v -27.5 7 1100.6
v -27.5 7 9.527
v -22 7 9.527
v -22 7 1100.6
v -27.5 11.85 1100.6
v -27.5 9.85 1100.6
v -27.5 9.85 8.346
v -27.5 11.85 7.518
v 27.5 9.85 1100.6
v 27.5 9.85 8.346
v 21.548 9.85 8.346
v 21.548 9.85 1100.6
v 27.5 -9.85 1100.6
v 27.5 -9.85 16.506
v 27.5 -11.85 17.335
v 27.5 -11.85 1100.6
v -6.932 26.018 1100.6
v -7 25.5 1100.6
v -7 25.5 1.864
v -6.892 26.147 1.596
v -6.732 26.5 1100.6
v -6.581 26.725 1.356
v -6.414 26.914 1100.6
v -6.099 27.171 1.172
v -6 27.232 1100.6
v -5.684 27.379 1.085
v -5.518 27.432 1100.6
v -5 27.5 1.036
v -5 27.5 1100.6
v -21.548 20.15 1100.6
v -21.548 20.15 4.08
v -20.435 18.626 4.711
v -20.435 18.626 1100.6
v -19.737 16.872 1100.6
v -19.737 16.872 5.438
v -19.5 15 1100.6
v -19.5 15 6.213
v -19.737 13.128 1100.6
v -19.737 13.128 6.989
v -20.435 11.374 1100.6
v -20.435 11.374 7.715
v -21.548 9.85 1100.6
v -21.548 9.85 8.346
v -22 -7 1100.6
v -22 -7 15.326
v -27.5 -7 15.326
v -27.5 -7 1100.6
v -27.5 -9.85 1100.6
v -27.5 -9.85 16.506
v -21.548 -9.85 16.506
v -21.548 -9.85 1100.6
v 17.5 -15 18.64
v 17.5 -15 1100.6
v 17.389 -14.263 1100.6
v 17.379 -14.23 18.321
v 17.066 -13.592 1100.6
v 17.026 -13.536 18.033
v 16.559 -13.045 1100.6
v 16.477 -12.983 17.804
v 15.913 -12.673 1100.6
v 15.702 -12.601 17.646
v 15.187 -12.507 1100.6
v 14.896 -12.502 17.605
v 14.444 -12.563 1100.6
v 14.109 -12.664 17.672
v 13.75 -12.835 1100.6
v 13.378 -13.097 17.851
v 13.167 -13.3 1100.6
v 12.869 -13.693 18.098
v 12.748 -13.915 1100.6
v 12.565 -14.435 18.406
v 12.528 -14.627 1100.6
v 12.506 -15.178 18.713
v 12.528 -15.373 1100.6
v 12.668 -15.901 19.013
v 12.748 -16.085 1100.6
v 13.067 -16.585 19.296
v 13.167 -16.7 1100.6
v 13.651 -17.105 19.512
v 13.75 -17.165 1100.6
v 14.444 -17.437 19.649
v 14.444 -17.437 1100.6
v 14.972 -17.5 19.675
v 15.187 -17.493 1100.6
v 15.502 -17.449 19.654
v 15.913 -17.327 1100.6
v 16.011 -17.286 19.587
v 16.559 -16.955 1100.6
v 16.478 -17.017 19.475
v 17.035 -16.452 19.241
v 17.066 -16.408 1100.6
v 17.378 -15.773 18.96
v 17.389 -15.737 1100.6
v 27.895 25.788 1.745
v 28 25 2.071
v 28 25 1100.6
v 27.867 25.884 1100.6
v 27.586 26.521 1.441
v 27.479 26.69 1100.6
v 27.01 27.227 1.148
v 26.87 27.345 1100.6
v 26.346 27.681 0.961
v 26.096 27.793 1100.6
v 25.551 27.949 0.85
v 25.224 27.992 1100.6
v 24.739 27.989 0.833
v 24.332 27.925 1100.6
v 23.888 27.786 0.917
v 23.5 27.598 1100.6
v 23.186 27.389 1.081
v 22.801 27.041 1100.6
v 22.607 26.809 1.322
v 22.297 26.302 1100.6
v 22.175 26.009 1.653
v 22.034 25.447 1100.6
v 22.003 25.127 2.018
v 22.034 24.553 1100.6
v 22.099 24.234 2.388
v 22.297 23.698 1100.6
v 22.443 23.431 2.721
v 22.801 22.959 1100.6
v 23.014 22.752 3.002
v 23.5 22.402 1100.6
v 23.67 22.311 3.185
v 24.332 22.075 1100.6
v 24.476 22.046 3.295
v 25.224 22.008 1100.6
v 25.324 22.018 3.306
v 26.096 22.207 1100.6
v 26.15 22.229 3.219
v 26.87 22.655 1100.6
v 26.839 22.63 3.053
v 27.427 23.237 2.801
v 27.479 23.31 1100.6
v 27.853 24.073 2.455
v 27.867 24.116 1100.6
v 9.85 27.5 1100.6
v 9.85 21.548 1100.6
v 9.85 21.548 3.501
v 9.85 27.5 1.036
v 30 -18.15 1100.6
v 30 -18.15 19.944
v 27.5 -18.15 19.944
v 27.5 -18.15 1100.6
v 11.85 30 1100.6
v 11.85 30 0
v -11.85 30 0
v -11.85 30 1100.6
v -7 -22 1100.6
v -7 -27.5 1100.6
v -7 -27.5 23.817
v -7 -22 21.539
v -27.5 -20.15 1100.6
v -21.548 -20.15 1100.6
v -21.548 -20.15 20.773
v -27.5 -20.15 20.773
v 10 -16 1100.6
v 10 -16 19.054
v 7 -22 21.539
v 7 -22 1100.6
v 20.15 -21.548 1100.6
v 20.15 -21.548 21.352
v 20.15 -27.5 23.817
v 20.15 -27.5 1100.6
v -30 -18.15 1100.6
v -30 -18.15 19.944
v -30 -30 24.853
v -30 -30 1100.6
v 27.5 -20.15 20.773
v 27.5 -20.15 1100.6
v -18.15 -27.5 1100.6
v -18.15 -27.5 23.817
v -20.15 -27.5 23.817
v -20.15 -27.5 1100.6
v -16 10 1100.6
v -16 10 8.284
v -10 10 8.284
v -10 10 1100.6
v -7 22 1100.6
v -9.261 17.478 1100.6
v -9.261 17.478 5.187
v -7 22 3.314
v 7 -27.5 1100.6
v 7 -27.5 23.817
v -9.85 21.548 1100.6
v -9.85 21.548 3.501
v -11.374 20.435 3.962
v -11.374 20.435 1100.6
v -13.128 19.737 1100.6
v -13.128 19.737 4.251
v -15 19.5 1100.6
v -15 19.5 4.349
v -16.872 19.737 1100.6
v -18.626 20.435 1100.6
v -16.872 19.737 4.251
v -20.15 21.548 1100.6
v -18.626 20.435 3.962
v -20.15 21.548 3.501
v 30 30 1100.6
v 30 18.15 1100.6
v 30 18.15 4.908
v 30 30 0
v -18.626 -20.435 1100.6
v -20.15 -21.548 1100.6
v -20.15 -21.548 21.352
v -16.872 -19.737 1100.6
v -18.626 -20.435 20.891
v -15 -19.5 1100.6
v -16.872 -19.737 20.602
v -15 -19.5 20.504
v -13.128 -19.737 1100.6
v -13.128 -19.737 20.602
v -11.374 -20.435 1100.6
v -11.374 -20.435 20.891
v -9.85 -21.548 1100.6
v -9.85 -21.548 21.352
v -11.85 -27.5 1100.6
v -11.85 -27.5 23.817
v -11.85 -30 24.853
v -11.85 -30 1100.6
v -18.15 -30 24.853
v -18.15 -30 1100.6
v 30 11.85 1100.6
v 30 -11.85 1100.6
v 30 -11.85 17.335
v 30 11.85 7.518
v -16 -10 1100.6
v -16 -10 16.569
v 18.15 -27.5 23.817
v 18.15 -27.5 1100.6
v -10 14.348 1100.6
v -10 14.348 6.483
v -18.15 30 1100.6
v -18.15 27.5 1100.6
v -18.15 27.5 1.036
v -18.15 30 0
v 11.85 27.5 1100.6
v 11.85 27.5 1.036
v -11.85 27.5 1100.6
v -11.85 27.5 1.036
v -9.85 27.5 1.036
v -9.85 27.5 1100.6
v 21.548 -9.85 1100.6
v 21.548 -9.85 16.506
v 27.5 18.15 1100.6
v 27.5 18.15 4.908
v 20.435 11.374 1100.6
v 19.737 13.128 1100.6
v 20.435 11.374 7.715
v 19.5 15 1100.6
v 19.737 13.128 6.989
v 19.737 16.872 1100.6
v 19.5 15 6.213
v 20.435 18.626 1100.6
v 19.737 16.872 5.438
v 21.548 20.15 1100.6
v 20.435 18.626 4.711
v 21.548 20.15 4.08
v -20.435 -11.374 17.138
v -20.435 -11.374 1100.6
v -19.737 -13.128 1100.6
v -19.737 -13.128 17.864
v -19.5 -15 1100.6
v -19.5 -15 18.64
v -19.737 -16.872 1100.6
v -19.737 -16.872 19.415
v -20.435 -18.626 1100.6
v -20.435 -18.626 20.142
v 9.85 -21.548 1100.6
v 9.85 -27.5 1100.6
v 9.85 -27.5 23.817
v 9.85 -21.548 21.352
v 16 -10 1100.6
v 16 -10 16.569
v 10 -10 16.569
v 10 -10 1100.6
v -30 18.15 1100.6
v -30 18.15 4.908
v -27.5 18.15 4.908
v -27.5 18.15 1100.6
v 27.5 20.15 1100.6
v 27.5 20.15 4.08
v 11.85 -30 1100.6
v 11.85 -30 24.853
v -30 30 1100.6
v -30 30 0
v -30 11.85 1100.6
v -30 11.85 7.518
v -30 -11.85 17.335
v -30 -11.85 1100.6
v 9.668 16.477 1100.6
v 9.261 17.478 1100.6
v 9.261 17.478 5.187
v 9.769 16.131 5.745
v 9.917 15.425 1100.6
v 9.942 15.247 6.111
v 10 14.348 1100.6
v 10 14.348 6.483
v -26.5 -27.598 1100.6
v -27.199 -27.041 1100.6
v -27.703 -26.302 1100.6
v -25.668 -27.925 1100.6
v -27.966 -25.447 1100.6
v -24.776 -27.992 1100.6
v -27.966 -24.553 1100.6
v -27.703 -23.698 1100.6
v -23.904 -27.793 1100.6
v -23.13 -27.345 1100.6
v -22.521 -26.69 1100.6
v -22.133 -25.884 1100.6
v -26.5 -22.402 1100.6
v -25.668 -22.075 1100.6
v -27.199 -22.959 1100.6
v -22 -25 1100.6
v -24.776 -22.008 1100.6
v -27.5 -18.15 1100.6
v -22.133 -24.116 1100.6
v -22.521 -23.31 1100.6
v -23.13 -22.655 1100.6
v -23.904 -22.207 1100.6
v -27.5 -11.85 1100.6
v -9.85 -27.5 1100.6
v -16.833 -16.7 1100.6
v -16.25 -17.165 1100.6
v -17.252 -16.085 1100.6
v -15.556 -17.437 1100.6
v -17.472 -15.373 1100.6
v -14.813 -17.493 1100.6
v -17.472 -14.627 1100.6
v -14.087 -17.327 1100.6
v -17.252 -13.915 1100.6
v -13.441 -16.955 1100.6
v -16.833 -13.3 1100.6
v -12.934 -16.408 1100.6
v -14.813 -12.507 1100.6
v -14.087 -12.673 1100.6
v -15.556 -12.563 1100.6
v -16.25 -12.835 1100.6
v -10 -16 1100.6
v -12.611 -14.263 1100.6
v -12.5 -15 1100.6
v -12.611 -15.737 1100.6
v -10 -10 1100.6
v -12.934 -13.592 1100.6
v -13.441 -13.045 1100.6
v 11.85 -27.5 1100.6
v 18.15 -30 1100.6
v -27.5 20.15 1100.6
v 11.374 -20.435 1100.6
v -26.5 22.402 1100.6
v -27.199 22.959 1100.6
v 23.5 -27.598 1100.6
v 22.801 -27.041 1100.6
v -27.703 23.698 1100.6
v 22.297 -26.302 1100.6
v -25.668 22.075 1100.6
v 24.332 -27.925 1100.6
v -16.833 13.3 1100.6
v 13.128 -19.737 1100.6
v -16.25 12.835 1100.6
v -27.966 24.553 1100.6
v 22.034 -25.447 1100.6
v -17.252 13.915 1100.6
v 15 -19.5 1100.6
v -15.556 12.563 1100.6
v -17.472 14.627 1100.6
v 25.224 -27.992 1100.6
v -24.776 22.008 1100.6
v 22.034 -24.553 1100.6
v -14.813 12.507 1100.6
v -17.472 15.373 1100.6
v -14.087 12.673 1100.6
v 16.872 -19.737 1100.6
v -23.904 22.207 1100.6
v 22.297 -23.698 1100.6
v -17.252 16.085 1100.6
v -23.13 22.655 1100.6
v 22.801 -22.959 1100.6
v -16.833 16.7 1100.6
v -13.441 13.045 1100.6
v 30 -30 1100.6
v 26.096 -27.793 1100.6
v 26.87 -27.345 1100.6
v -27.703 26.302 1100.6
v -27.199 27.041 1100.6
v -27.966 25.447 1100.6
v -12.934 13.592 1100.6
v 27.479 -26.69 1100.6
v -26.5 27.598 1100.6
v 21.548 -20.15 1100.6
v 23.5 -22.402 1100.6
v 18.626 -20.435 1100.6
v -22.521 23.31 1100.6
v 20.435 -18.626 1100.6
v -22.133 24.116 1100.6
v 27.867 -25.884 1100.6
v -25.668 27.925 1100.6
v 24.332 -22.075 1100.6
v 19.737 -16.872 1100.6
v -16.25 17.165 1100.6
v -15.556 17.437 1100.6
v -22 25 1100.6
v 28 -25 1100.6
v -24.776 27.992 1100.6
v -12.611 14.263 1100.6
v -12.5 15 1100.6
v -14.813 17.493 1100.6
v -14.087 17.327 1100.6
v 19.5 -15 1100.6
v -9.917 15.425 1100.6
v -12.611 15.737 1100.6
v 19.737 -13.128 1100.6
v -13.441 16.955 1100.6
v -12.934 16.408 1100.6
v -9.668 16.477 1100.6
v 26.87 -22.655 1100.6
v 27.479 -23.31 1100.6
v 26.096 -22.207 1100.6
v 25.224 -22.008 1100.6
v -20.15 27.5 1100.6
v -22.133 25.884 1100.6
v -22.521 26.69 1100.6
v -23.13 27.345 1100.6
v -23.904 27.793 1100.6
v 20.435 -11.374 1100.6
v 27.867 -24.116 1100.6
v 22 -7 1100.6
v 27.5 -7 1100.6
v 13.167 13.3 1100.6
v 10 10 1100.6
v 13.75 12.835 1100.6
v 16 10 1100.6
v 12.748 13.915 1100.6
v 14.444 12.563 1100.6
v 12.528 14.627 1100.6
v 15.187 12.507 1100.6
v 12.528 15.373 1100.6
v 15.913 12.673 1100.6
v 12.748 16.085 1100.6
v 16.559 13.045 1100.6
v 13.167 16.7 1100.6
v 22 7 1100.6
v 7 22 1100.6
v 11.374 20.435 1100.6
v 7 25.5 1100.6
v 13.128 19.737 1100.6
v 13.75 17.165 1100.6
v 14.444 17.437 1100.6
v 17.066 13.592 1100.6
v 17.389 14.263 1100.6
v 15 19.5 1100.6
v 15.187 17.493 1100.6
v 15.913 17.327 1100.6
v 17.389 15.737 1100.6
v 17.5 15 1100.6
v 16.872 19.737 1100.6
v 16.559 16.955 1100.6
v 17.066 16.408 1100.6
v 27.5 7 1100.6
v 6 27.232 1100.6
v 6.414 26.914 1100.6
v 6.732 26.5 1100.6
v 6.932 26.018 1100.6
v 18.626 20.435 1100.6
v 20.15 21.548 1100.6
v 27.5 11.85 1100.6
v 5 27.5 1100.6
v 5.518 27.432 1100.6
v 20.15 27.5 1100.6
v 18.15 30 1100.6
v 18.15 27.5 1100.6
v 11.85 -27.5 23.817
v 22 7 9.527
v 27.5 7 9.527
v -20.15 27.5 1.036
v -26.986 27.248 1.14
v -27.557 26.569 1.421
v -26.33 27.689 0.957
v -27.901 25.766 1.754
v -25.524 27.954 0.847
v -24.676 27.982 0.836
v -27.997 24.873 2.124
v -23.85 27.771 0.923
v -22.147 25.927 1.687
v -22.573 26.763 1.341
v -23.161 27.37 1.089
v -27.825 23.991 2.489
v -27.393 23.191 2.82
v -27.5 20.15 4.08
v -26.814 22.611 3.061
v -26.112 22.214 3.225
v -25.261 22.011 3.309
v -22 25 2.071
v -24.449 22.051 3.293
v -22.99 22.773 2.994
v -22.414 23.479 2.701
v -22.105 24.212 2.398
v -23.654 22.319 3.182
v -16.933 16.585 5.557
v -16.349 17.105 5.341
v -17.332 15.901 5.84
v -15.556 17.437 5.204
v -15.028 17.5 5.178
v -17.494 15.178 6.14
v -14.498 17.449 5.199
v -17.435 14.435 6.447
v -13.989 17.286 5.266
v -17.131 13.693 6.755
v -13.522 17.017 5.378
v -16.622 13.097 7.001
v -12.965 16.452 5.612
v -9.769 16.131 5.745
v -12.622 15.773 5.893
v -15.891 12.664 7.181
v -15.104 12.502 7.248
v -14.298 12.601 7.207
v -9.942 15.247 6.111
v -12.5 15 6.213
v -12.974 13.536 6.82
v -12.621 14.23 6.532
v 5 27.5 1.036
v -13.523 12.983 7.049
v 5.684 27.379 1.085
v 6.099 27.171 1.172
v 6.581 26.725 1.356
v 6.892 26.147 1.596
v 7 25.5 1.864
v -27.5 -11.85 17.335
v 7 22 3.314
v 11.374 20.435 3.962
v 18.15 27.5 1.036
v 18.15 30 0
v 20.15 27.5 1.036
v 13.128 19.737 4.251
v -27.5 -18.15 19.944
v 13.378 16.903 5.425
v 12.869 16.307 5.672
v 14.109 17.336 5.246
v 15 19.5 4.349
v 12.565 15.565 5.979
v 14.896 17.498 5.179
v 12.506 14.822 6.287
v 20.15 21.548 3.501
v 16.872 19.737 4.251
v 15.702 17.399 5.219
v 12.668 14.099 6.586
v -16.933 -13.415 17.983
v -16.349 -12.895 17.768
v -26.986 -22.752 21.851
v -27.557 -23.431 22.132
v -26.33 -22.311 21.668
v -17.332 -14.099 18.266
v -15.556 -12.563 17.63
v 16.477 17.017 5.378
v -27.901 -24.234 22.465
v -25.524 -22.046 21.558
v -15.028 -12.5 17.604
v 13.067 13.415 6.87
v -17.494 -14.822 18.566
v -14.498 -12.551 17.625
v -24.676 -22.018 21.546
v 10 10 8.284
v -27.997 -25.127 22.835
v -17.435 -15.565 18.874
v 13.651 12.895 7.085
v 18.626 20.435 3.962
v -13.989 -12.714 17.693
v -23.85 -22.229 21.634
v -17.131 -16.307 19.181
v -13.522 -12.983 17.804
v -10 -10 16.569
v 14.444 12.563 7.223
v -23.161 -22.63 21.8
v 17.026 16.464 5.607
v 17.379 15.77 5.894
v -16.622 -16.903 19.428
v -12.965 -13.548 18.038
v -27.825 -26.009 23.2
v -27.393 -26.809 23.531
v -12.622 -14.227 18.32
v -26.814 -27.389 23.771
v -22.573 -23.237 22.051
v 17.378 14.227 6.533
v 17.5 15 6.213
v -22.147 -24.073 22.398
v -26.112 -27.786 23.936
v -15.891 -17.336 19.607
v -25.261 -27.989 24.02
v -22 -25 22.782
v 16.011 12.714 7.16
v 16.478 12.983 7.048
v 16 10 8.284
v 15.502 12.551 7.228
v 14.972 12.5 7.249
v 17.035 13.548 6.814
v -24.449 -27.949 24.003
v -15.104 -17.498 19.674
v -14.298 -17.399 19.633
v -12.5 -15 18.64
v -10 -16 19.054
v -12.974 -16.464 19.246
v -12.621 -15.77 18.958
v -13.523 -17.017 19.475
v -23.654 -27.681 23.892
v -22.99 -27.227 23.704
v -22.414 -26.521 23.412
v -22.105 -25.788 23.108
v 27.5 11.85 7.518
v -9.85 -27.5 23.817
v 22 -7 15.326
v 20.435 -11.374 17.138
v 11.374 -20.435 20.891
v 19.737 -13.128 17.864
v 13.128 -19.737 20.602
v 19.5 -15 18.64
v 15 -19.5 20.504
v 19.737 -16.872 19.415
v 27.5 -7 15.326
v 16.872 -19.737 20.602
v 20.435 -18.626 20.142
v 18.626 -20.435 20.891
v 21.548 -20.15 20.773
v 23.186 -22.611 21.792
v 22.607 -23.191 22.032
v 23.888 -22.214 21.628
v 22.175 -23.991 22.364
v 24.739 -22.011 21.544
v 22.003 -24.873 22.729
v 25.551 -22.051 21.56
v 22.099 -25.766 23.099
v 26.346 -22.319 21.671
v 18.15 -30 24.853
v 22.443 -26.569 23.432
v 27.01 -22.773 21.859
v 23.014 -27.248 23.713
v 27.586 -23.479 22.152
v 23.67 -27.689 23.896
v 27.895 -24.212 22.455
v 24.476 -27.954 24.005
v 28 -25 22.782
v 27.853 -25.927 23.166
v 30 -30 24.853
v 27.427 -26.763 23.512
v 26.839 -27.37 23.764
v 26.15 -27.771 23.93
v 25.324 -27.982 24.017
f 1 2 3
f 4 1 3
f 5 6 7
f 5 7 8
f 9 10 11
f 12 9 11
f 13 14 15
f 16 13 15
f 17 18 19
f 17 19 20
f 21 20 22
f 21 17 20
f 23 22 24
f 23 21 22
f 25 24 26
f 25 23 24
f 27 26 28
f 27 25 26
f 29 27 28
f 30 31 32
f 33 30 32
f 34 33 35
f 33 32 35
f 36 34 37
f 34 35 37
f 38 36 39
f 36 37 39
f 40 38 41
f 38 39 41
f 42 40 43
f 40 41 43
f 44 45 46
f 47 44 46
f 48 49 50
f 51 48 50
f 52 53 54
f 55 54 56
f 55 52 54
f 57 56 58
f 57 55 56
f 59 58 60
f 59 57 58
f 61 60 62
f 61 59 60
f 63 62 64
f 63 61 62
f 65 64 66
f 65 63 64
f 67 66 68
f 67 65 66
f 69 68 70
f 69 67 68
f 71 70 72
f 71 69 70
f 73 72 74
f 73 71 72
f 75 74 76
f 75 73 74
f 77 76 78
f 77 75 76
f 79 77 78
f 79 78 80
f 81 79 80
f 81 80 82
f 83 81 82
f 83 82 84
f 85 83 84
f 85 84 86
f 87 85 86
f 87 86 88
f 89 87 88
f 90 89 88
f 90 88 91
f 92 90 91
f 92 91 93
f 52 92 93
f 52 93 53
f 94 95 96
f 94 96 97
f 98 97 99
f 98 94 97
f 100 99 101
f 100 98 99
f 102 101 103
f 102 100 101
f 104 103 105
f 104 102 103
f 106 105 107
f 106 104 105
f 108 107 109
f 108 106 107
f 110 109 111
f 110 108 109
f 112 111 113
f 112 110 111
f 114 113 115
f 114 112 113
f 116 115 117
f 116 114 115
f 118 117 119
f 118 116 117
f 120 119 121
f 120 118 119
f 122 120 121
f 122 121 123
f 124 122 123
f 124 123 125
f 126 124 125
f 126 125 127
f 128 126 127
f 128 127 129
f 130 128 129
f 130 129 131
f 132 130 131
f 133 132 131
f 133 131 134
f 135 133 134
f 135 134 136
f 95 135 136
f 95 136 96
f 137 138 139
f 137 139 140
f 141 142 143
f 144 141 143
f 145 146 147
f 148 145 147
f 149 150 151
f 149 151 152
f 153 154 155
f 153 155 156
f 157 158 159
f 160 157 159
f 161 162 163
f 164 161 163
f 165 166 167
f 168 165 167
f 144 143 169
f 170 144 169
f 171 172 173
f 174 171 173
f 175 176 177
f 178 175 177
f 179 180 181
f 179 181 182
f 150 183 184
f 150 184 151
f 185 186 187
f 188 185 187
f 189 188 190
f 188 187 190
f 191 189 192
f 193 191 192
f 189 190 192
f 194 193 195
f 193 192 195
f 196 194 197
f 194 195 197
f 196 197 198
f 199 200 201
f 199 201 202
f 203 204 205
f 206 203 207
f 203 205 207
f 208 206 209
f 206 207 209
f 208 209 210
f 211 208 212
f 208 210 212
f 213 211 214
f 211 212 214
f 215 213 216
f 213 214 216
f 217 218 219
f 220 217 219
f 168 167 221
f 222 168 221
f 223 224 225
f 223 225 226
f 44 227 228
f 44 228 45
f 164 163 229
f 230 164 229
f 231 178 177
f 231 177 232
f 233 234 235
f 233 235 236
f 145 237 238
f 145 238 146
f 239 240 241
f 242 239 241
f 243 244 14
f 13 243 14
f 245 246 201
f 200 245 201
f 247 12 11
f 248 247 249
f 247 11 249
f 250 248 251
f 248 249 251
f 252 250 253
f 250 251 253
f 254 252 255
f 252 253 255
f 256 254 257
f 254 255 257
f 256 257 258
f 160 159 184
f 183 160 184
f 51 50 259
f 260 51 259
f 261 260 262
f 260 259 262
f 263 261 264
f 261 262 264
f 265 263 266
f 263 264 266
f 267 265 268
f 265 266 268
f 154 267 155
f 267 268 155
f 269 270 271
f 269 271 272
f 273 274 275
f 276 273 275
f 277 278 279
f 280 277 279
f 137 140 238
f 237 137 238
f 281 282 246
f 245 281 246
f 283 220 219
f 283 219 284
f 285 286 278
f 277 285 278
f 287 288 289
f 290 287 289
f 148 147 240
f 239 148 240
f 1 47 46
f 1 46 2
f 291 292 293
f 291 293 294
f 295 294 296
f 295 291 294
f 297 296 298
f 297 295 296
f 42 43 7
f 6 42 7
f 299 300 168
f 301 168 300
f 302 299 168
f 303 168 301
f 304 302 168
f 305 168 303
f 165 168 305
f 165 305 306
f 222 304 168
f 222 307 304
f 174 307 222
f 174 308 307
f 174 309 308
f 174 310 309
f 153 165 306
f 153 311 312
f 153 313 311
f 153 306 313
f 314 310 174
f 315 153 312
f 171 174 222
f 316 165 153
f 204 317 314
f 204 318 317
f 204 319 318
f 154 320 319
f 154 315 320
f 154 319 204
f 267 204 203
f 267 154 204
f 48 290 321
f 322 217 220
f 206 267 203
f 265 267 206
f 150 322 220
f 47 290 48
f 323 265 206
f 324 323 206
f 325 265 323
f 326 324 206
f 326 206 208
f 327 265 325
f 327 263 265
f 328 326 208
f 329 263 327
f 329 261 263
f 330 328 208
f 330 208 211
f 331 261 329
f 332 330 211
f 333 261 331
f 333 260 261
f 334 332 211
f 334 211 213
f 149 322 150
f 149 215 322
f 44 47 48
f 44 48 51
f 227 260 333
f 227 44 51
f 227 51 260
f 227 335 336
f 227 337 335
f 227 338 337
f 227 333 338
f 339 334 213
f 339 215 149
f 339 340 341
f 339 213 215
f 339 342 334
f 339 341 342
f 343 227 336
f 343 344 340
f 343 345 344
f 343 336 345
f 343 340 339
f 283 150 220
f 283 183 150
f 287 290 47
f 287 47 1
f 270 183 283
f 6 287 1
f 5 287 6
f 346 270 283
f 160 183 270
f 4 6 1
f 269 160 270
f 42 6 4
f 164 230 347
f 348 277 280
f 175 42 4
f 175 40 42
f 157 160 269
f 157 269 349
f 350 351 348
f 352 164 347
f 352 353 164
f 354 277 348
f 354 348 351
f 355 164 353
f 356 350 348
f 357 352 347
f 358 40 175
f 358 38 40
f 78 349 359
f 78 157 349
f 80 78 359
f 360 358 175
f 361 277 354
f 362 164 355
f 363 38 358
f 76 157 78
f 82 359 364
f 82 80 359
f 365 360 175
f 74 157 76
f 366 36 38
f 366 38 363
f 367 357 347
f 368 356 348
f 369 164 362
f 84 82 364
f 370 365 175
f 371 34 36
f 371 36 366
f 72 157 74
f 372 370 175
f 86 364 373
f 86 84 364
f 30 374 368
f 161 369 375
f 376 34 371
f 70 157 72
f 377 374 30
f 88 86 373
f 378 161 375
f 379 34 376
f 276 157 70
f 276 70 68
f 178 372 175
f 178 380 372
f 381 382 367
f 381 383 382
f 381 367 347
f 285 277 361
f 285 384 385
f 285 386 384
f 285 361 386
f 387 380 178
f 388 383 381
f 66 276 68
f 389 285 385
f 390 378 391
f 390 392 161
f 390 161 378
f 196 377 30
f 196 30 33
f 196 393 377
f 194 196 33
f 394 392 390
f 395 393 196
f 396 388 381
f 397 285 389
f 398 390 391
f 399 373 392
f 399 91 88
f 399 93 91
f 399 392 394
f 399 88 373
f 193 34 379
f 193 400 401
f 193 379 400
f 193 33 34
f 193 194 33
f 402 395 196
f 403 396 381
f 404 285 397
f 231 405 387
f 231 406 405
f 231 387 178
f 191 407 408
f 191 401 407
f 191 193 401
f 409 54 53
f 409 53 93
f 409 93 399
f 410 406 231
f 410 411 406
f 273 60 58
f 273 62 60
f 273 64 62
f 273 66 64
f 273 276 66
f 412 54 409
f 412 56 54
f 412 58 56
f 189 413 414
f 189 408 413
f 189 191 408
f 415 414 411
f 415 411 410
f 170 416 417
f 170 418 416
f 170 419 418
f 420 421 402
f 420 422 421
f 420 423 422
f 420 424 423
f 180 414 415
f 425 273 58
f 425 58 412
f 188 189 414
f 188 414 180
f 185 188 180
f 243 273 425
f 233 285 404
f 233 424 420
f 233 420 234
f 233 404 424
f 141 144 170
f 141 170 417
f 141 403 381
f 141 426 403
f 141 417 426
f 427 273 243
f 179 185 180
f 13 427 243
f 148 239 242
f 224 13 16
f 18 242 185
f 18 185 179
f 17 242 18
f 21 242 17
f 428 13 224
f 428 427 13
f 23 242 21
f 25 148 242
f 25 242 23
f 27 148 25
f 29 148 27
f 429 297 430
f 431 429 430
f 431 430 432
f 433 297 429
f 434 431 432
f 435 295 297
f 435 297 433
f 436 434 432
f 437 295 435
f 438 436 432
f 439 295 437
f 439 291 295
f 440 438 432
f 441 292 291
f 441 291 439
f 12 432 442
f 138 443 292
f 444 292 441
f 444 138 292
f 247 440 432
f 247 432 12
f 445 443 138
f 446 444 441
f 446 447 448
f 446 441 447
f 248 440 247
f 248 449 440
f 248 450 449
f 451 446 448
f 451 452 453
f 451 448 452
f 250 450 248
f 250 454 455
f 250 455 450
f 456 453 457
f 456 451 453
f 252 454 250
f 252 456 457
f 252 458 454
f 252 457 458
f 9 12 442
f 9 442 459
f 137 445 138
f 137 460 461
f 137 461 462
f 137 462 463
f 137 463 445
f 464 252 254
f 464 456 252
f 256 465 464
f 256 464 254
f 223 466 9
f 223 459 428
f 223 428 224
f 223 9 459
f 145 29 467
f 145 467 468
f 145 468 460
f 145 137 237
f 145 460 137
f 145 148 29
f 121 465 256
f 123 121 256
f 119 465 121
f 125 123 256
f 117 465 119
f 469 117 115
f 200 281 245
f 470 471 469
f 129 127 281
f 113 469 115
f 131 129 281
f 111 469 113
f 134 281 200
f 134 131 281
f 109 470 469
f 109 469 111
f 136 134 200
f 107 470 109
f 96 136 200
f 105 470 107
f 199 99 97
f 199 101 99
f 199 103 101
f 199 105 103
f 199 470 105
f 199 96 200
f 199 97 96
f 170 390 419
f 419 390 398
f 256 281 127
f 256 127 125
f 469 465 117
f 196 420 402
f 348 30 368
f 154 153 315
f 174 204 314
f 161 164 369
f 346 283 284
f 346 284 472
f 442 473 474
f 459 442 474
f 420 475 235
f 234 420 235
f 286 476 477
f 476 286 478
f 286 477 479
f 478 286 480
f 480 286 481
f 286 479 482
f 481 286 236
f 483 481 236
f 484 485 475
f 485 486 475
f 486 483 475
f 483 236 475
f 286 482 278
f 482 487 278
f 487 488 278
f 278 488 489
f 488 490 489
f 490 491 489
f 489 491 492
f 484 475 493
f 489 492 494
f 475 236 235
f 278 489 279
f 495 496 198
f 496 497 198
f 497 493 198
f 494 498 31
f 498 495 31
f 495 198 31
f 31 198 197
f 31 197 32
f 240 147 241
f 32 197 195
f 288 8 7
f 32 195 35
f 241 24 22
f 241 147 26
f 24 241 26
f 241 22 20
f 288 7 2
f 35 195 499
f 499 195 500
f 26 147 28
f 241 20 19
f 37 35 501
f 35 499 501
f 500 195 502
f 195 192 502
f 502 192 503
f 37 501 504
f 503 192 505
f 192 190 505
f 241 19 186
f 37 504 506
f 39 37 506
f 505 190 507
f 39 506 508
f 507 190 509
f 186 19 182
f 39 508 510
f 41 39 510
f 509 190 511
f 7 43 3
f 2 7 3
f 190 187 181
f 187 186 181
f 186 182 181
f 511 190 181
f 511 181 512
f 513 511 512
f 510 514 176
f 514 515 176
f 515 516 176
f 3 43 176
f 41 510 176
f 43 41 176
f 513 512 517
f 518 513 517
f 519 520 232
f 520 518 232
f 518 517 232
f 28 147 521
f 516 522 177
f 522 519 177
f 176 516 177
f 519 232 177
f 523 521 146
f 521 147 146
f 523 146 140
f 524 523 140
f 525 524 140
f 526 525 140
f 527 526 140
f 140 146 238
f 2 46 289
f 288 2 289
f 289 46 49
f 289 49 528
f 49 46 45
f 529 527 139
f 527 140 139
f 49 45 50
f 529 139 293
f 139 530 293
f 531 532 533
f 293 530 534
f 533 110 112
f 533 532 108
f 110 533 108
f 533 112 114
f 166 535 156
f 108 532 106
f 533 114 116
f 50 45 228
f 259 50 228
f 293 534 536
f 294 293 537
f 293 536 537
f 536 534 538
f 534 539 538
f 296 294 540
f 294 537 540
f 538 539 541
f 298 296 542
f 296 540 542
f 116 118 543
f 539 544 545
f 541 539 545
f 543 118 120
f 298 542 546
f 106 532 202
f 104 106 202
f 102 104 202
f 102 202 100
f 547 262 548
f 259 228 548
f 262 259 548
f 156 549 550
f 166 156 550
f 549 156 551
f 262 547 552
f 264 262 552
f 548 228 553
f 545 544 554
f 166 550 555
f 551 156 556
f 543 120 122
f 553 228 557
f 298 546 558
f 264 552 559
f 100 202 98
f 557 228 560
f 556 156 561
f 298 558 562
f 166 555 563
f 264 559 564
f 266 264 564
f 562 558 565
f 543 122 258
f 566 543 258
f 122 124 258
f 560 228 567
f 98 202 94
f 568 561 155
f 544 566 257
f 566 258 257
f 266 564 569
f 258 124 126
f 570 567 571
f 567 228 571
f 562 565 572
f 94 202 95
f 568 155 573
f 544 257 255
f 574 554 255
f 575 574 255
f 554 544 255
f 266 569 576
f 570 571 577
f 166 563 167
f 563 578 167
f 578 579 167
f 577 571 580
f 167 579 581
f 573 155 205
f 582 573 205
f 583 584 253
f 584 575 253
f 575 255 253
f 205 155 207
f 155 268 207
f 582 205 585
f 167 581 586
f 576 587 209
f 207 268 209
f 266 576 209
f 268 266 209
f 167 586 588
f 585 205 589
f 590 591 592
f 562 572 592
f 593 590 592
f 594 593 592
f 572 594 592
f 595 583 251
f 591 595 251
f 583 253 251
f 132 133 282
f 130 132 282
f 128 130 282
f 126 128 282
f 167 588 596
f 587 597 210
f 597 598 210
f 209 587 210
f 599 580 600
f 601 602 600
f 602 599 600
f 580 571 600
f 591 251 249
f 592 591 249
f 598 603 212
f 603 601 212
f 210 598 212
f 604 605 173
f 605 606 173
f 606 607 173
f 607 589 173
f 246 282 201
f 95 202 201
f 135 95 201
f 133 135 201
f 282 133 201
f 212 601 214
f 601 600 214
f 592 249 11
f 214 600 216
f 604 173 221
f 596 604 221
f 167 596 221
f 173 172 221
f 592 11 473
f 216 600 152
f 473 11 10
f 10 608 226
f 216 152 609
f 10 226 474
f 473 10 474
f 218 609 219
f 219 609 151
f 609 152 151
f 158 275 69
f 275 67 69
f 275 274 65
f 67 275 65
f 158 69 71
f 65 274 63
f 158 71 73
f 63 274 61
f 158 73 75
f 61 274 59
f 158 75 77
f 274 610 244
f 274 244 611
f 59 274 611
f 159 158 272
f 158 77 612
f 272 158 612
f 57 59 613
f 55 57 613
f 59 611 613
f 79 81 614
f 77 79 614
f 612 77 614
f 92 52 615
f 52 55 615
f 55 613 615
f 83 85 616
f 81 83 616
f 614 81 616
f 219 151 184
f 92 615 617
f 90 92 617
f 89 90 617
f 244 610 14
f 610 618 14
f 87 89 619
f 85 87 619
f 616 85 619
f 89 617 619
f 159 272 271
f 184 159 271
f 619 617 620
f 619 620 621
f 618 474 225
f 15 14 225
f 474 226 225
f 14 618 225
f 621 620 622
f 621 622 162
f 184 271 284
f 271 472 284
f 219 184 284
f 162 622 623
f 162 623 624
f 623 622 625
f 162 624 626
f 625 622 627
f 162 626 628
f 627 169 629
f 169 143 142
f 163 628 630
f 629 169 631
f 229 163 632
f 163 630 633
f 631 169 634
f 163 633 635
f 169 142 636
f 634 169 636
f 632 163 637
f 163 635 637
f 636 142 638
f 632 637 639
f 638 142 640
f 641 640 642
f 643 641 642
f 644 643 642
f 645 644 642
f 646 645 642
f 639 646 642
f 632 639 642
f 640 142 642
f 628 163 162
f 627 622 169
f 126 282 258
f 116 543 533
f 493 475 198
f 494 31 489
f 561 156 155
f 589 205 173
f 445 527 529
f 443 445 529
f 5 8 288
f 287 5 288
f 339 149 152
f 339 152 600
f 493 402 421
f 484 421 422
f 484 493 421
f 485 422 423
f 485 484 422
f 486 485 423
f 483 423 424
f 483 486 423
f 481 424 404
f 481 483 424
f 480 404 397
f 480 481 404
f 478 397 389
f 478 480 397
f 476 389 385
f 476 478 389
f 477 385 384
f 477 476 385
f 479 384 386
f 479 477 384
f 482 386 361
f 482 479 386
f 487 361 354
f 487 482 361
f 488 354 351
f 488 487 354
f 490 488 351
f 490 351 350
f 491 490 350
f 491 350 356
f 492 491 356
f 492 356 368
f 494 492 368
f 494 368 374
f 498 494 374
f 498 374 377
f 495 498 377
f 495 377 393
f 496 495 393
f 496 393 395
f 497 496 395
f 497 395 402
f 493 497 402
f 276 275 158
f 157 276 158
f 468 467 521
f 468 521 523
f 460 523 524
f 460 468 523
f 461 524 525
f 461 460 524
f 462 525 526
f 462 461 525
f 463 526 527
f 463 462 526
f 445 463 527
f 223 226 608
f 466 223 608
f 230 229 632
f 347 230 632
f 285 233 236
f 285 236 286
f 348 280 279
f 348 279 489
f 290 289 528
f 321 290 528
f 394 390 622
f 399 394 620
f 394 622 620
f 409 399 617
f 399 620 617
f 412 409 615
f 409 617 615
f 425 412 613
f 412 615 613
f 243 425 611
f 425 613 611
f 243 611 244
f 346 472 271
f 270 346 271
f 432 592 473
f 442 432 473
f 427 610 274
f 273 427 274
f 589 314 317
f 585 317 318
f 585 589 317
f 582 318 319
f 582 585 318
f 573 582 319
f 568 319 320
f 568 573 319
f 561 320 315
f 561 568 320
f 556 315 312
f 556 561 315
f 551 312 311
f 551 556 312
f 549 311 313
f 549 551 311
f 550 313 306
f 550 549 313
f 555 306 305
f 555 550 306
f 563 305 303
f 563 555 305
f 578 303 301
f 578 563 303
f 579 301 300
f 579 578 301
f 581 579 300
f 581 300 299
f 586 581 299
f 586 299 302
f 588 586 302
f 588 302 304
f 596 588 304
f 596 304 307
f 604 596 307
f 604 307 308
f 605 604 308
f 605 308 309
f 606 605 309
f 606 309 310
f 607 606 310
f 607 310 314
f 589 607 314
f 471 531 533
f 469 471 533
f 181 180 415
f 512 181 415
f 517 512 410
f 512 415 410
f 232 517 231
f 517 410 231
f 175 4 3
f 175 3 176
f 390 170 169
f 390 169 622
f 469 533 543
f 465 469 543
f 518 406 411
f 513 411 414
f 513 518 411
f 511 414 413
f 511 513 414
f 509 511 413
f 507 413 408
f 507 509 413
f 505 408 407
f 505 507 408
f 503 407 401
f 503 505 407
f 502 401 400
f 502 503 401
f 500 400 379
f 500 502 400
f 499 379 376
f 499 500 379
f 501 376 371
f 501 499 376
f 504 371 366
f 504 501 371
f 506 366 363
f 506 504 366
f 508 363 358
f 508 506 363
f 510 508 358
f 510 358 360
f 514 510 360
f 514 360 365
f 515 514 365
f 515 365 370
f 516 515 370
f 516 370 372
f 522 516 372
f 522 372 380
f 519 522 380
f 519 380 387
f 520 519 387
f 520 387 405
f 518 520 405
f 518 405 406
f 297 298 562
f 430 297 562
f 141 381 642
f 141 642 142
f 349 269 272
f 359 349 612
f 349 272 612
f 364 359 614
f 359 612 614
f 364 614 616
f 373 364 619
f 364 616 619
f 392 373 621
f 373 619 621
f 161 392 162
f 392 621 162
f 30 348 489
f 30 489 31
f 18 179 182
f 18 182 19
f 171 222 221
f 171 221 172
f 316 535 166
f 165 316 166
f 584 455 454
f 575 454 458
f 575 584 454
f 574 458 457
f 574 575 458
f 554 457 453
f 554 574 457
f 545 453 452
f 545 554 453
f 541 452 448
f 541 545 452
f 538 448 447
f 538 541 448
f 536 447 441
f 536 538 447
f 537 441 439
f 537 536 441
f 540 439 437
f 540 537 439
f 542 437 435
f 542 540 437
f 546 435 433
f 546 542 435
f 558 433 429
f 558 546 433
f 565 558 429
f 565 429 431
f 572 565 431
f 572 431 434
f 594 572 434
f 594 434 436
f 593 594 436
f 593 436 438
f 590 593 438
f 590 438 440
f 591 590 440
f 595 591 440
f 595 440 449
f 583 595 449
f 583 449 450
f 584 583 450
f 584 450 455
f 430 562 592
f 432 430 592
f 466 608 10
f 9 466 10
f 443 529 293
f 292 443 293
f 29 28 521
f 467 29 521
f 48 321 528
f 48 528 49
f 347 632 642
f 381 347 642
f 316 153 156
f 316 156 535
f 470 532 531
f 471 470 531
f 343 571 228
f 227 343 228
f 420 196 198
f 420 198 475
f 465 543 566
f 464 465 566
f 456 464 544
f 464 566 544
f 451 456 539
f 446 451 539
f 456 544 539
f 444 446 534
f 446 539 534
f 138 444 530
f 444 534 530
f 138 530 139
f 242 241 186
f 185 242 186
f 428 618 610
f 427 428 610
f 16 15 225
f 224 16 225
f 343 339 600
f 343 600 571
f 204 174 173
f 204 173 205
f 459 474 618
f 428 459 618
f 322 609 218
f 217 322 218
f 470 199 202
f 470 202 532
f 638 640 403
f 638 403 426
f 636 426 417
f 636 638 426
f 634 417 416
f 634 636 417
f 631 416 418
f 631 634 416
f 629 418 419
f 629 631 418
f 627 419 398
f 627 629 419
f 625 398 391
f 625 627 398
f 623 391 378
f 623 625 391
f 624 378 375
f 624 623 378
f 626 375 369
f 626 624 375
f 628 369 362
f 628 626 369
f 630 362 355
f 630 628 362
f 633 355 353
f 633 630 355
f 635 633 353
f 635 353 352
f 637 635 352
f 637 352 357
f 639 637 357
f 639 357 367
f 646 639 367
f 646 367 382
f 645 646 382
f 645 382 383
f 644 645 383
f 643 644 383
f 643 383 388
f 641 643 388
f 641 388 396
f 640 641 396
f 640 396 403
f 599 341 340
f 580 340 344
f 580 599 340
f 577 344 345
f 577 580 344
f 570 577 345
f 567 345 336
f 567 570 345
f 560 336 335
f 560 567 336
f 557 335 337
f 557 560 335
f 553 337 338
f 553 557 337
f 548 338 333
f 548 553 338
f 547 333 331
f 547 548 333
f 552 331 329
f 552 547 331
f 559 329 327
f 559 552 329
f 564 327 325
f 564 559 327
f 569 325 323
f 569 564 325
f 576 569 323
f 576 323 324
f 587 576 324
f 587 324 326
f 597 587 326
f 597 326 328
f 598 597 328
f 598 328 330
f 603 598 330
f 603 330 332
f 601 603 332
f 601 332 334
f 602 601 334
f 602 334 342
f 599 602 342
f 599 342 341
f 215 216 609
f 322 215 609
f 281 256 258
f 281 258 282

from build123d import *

# Parameters (mm, degrees)
F0_R          = 3
F0_R_2        = 2.5
F1_DEPTH      = 1100.6
F2_R          = 2
F3_R          = 7
F5_DEPTH      = 30
F5_DEPTH_BACK = 30


# Not quite as in the source:
# - a feature names something its author has since deleted; it is built from what else it names


with BuildPart() as f1:
    # F0 (on Top) → F1 (new body)
    with BuildSketch(Plane.XY):
        with BuildLine():
            Line((18.15, -30), (30, -30))
            Line((30, -30), (30, -18.15))
            Line((30, -18.15), (27.5, -18.15))
            Line((27.5, -18.15), (27.5, -20.15))
            Line((27.5, -20.15), (21.5477069044, -20.15))
            ThreePointArc((21.5477069044, -20.15), (19.5, -15), (21.5477069044, -9.85))
            Line((21.5477069044, -9.85), (27.5, -9.85))
            Line((27.5, -9.85), (27.5, -11.85))
            Line((27.5, -11.85), (30, -11.85))
            Line((30, -11.85), (30, 11.85))
            Line((30, 11.85), (27.5, 11.85))
            Line((27.5, 11.85), (27.5, 9.85))
            Line((27.5, 9.85), (21.5477069044, 9.85))
            ThreePointArc((21.5477069044, 9.85), (19.5, 15), (21.5477069044, 20.15))
            Line((21.5477069044, 20.15), (27.5, 20.15))
            Line((27.5, 20.15), (27.5, 18.15))
            Line((27.5, 18.15), (30, 18.15))
            Line((30, 18.15), (30, 30))
            Line((30, 30), (18.15, 30))
            Line((18.15, 30), (18.15, 27.5))
            Line((18.15, 27.5), (20.15, 27.5))
            Line((20.15, 27.5), (20.15, 21.5477069044))
            ThreePointArc((20.15, 21.5477069044), (15, 19.5), (9.85, 21.5477069044))
            Line((9.85, 21.5477069044), (9.85, 27.5))
            Line((9.85, 27.5), (11.85, 27.5))
            Line((11.85, 27.5), (11.85, 30))
            Line((11.85, 30), (-11.85, 30))
            Line((-11.85, 30), (-11.85, 27.5))
            Line((-11.85, 27.5), (-9.85, 27.5))
            Line((-9.85, 27.5), (-9.85, 21.5477069044))
            ThreePointArc((-9.85, 21.5477069044), (-15, 19.5), (-20.15, 21.5477069044))
            Line((-20.15, 21.5477069044), (-20.15, 27.5))
            Line((-20.15, 27.5), (-18.15, 27.5))
            Line((-18.15, 27.5), (-18.15, 30))
            Line((-18.15, 30), (-30, 30))
            Line((-30, 30), (-30, 18.15))
            Line((-30, 18.15), (-27.5, 18.15))
            Line((-27.5, 18.15), (-27.5, 20.15))
            Line((-27.5, 20.15), (-21.5477069044, 20.15))
            ThreePointArc((-21.5477069044, 20.15), (-19.5, 15), (-21.5477069044, 9.85))
            Line((-21.5477069044, 9.85), (-27.5, 9.85))
            Line((-27.5, 9.85), (-27.5, 11.85))
            Line((-27.5, 11.85), (-30, 11.85))
            Line((-30, 11.85), (-30, -11.85))
            Line((-30, -11.85), (-27.5, -11.85))
            Line((-27.5, -11.85), (-27.5, -9.85))
            Line((-27.5, -9.85), (-21.5477069044, -9.85))
            ThreePointArc((-21.5477069044, -9.85), (-19.5, -15), (-21.5477069044, -20.15))
            Line((-21.5477069044, -20.15), (-27.5, -20.15))
            Line((-27.5, -20.15), (-27.5, -18.15))
            Line((-27.5, -18.15), (-30, -18.15))
            Line((-30, -18.15), (-30, -30))
            Line((-30, -30), (-18.15, -30))
            Line((-18.15, -30), (-18.15, -27.5))
            Line((-18.15, -27.5), (-20.15, -27.5))
            Line((-20.15, -27.5), (-20.15, -21.5477069044))
            ThreePointArc((-20.15, -21.5477069044), (-15, -19.5), (-9.85, -21.5477069044))
            Line((-9.85, -21.5477069044), (-9.85, -27.5))
            Line((-9.85, -27.5), (-11.85, -27.5))
            Line((-11.85, -27.5), (-11.85, -30))
            Line((-11.85, -30), (11.85, -30))
            Line((11.85, -30), (11.85, -27.5))
            Line((11.85, -27.5), (9.85, -27.5))
            Line((9.85, -27.5), (9.85, -21.5477069044))
            ThreePointArc((9.85, -21.5477069044), (15, -19.5), (20.15, -21.5477069044))
            Line((20.15, -21.5477069044), (20.15, -27.5))
            Line((20.15, -27.5), (18.15, -27.5))
            Line((18.15, -27.5), (18.15, -30))
        make_face()
        with Locations((-25, -25)):
            Circle(F0_R, mode=Mode.SUBTRACT)
        with Locations((-15, -15)):
            Circle(F0_R_2, mode=Mode.SUBTRACT)
        with Locations((25, -25)):
            Circle(F0_R, mode=Mode.SUBTRACT)
        with Locations((15, -15)):
            Circle(F0_R_2, mode=Mode.SUBTRACT)
        with Locations((-25, 25)):
            Circle(F0_R, mode=Mode.SUBTRACT)
        with Locations((-15, 15)):
            Circle(F0_R_2, mode=Mode.SUBTRACT)
        Polygon((-7, 22), (-7, 27.5), (0, 27.5), (7, 27.5), (7, 22), (10, 16), (10, 10), (16, 10), (22, 7), (27.5, 7), (27.5, 0), (27.5, -7), (22, -7), (16, -10), (10, -10), (10, -16), (7, -22), (7, -27.5), (0, -27.5), (-7, -27.5), (-7, -22), (-10, -16), (-10, -10), (-16, -10), (-22, -7), (-27.5, -7), (-27.5, 0), (-27.5, 7), (-22, 7), (-16, 10), (-10, 10), (-10, 16), align=None, mode=Mode.SUBTRACT)
        with Locations((15, 15)):
            Circle(F0_R_2, mode=Mode.SUBTRACT)
        with Locations((25, 25)):
            Circle(F0_R, mode=Mode.SUBTRACT)
    extrude(amount=F1_DEPTH)

    # F2
    f2_edges = [f1.edges().sort_by_distance(p)[0] for p in [
        (-7, 27.5, 550.3),
        (7, 27.5, 550.3),
    ]]
    fillet(f2_edges, radius=F2_R)

    # F3
    f3_edges = [f1.edges().sort_by_distance(p)[0] for p in [
        (-10, 16, 550.3),
        (10, 16, 550.3),
    ]]
    fillet(f3_edges, radius=F3_R)

    # F4 (on Right) → F5 (cut, two sides)
    with BuildSketch(Plane.YZ) as f5_sk:
        Polygon((-153.0130330148, 75.8064803658), (-200.6900714338, -39.2960723993), (-17.6770384191, -115.1025527651), (30, 0), align=None)
    extrude(amount=F5_DEPTH, mode=Mode.SUBTRACT)
    extrude(f5_sk.sketch, amount=-F5_DEPTH_BACK, mode=Mode.SUBTRACT)


solid = f1.part
